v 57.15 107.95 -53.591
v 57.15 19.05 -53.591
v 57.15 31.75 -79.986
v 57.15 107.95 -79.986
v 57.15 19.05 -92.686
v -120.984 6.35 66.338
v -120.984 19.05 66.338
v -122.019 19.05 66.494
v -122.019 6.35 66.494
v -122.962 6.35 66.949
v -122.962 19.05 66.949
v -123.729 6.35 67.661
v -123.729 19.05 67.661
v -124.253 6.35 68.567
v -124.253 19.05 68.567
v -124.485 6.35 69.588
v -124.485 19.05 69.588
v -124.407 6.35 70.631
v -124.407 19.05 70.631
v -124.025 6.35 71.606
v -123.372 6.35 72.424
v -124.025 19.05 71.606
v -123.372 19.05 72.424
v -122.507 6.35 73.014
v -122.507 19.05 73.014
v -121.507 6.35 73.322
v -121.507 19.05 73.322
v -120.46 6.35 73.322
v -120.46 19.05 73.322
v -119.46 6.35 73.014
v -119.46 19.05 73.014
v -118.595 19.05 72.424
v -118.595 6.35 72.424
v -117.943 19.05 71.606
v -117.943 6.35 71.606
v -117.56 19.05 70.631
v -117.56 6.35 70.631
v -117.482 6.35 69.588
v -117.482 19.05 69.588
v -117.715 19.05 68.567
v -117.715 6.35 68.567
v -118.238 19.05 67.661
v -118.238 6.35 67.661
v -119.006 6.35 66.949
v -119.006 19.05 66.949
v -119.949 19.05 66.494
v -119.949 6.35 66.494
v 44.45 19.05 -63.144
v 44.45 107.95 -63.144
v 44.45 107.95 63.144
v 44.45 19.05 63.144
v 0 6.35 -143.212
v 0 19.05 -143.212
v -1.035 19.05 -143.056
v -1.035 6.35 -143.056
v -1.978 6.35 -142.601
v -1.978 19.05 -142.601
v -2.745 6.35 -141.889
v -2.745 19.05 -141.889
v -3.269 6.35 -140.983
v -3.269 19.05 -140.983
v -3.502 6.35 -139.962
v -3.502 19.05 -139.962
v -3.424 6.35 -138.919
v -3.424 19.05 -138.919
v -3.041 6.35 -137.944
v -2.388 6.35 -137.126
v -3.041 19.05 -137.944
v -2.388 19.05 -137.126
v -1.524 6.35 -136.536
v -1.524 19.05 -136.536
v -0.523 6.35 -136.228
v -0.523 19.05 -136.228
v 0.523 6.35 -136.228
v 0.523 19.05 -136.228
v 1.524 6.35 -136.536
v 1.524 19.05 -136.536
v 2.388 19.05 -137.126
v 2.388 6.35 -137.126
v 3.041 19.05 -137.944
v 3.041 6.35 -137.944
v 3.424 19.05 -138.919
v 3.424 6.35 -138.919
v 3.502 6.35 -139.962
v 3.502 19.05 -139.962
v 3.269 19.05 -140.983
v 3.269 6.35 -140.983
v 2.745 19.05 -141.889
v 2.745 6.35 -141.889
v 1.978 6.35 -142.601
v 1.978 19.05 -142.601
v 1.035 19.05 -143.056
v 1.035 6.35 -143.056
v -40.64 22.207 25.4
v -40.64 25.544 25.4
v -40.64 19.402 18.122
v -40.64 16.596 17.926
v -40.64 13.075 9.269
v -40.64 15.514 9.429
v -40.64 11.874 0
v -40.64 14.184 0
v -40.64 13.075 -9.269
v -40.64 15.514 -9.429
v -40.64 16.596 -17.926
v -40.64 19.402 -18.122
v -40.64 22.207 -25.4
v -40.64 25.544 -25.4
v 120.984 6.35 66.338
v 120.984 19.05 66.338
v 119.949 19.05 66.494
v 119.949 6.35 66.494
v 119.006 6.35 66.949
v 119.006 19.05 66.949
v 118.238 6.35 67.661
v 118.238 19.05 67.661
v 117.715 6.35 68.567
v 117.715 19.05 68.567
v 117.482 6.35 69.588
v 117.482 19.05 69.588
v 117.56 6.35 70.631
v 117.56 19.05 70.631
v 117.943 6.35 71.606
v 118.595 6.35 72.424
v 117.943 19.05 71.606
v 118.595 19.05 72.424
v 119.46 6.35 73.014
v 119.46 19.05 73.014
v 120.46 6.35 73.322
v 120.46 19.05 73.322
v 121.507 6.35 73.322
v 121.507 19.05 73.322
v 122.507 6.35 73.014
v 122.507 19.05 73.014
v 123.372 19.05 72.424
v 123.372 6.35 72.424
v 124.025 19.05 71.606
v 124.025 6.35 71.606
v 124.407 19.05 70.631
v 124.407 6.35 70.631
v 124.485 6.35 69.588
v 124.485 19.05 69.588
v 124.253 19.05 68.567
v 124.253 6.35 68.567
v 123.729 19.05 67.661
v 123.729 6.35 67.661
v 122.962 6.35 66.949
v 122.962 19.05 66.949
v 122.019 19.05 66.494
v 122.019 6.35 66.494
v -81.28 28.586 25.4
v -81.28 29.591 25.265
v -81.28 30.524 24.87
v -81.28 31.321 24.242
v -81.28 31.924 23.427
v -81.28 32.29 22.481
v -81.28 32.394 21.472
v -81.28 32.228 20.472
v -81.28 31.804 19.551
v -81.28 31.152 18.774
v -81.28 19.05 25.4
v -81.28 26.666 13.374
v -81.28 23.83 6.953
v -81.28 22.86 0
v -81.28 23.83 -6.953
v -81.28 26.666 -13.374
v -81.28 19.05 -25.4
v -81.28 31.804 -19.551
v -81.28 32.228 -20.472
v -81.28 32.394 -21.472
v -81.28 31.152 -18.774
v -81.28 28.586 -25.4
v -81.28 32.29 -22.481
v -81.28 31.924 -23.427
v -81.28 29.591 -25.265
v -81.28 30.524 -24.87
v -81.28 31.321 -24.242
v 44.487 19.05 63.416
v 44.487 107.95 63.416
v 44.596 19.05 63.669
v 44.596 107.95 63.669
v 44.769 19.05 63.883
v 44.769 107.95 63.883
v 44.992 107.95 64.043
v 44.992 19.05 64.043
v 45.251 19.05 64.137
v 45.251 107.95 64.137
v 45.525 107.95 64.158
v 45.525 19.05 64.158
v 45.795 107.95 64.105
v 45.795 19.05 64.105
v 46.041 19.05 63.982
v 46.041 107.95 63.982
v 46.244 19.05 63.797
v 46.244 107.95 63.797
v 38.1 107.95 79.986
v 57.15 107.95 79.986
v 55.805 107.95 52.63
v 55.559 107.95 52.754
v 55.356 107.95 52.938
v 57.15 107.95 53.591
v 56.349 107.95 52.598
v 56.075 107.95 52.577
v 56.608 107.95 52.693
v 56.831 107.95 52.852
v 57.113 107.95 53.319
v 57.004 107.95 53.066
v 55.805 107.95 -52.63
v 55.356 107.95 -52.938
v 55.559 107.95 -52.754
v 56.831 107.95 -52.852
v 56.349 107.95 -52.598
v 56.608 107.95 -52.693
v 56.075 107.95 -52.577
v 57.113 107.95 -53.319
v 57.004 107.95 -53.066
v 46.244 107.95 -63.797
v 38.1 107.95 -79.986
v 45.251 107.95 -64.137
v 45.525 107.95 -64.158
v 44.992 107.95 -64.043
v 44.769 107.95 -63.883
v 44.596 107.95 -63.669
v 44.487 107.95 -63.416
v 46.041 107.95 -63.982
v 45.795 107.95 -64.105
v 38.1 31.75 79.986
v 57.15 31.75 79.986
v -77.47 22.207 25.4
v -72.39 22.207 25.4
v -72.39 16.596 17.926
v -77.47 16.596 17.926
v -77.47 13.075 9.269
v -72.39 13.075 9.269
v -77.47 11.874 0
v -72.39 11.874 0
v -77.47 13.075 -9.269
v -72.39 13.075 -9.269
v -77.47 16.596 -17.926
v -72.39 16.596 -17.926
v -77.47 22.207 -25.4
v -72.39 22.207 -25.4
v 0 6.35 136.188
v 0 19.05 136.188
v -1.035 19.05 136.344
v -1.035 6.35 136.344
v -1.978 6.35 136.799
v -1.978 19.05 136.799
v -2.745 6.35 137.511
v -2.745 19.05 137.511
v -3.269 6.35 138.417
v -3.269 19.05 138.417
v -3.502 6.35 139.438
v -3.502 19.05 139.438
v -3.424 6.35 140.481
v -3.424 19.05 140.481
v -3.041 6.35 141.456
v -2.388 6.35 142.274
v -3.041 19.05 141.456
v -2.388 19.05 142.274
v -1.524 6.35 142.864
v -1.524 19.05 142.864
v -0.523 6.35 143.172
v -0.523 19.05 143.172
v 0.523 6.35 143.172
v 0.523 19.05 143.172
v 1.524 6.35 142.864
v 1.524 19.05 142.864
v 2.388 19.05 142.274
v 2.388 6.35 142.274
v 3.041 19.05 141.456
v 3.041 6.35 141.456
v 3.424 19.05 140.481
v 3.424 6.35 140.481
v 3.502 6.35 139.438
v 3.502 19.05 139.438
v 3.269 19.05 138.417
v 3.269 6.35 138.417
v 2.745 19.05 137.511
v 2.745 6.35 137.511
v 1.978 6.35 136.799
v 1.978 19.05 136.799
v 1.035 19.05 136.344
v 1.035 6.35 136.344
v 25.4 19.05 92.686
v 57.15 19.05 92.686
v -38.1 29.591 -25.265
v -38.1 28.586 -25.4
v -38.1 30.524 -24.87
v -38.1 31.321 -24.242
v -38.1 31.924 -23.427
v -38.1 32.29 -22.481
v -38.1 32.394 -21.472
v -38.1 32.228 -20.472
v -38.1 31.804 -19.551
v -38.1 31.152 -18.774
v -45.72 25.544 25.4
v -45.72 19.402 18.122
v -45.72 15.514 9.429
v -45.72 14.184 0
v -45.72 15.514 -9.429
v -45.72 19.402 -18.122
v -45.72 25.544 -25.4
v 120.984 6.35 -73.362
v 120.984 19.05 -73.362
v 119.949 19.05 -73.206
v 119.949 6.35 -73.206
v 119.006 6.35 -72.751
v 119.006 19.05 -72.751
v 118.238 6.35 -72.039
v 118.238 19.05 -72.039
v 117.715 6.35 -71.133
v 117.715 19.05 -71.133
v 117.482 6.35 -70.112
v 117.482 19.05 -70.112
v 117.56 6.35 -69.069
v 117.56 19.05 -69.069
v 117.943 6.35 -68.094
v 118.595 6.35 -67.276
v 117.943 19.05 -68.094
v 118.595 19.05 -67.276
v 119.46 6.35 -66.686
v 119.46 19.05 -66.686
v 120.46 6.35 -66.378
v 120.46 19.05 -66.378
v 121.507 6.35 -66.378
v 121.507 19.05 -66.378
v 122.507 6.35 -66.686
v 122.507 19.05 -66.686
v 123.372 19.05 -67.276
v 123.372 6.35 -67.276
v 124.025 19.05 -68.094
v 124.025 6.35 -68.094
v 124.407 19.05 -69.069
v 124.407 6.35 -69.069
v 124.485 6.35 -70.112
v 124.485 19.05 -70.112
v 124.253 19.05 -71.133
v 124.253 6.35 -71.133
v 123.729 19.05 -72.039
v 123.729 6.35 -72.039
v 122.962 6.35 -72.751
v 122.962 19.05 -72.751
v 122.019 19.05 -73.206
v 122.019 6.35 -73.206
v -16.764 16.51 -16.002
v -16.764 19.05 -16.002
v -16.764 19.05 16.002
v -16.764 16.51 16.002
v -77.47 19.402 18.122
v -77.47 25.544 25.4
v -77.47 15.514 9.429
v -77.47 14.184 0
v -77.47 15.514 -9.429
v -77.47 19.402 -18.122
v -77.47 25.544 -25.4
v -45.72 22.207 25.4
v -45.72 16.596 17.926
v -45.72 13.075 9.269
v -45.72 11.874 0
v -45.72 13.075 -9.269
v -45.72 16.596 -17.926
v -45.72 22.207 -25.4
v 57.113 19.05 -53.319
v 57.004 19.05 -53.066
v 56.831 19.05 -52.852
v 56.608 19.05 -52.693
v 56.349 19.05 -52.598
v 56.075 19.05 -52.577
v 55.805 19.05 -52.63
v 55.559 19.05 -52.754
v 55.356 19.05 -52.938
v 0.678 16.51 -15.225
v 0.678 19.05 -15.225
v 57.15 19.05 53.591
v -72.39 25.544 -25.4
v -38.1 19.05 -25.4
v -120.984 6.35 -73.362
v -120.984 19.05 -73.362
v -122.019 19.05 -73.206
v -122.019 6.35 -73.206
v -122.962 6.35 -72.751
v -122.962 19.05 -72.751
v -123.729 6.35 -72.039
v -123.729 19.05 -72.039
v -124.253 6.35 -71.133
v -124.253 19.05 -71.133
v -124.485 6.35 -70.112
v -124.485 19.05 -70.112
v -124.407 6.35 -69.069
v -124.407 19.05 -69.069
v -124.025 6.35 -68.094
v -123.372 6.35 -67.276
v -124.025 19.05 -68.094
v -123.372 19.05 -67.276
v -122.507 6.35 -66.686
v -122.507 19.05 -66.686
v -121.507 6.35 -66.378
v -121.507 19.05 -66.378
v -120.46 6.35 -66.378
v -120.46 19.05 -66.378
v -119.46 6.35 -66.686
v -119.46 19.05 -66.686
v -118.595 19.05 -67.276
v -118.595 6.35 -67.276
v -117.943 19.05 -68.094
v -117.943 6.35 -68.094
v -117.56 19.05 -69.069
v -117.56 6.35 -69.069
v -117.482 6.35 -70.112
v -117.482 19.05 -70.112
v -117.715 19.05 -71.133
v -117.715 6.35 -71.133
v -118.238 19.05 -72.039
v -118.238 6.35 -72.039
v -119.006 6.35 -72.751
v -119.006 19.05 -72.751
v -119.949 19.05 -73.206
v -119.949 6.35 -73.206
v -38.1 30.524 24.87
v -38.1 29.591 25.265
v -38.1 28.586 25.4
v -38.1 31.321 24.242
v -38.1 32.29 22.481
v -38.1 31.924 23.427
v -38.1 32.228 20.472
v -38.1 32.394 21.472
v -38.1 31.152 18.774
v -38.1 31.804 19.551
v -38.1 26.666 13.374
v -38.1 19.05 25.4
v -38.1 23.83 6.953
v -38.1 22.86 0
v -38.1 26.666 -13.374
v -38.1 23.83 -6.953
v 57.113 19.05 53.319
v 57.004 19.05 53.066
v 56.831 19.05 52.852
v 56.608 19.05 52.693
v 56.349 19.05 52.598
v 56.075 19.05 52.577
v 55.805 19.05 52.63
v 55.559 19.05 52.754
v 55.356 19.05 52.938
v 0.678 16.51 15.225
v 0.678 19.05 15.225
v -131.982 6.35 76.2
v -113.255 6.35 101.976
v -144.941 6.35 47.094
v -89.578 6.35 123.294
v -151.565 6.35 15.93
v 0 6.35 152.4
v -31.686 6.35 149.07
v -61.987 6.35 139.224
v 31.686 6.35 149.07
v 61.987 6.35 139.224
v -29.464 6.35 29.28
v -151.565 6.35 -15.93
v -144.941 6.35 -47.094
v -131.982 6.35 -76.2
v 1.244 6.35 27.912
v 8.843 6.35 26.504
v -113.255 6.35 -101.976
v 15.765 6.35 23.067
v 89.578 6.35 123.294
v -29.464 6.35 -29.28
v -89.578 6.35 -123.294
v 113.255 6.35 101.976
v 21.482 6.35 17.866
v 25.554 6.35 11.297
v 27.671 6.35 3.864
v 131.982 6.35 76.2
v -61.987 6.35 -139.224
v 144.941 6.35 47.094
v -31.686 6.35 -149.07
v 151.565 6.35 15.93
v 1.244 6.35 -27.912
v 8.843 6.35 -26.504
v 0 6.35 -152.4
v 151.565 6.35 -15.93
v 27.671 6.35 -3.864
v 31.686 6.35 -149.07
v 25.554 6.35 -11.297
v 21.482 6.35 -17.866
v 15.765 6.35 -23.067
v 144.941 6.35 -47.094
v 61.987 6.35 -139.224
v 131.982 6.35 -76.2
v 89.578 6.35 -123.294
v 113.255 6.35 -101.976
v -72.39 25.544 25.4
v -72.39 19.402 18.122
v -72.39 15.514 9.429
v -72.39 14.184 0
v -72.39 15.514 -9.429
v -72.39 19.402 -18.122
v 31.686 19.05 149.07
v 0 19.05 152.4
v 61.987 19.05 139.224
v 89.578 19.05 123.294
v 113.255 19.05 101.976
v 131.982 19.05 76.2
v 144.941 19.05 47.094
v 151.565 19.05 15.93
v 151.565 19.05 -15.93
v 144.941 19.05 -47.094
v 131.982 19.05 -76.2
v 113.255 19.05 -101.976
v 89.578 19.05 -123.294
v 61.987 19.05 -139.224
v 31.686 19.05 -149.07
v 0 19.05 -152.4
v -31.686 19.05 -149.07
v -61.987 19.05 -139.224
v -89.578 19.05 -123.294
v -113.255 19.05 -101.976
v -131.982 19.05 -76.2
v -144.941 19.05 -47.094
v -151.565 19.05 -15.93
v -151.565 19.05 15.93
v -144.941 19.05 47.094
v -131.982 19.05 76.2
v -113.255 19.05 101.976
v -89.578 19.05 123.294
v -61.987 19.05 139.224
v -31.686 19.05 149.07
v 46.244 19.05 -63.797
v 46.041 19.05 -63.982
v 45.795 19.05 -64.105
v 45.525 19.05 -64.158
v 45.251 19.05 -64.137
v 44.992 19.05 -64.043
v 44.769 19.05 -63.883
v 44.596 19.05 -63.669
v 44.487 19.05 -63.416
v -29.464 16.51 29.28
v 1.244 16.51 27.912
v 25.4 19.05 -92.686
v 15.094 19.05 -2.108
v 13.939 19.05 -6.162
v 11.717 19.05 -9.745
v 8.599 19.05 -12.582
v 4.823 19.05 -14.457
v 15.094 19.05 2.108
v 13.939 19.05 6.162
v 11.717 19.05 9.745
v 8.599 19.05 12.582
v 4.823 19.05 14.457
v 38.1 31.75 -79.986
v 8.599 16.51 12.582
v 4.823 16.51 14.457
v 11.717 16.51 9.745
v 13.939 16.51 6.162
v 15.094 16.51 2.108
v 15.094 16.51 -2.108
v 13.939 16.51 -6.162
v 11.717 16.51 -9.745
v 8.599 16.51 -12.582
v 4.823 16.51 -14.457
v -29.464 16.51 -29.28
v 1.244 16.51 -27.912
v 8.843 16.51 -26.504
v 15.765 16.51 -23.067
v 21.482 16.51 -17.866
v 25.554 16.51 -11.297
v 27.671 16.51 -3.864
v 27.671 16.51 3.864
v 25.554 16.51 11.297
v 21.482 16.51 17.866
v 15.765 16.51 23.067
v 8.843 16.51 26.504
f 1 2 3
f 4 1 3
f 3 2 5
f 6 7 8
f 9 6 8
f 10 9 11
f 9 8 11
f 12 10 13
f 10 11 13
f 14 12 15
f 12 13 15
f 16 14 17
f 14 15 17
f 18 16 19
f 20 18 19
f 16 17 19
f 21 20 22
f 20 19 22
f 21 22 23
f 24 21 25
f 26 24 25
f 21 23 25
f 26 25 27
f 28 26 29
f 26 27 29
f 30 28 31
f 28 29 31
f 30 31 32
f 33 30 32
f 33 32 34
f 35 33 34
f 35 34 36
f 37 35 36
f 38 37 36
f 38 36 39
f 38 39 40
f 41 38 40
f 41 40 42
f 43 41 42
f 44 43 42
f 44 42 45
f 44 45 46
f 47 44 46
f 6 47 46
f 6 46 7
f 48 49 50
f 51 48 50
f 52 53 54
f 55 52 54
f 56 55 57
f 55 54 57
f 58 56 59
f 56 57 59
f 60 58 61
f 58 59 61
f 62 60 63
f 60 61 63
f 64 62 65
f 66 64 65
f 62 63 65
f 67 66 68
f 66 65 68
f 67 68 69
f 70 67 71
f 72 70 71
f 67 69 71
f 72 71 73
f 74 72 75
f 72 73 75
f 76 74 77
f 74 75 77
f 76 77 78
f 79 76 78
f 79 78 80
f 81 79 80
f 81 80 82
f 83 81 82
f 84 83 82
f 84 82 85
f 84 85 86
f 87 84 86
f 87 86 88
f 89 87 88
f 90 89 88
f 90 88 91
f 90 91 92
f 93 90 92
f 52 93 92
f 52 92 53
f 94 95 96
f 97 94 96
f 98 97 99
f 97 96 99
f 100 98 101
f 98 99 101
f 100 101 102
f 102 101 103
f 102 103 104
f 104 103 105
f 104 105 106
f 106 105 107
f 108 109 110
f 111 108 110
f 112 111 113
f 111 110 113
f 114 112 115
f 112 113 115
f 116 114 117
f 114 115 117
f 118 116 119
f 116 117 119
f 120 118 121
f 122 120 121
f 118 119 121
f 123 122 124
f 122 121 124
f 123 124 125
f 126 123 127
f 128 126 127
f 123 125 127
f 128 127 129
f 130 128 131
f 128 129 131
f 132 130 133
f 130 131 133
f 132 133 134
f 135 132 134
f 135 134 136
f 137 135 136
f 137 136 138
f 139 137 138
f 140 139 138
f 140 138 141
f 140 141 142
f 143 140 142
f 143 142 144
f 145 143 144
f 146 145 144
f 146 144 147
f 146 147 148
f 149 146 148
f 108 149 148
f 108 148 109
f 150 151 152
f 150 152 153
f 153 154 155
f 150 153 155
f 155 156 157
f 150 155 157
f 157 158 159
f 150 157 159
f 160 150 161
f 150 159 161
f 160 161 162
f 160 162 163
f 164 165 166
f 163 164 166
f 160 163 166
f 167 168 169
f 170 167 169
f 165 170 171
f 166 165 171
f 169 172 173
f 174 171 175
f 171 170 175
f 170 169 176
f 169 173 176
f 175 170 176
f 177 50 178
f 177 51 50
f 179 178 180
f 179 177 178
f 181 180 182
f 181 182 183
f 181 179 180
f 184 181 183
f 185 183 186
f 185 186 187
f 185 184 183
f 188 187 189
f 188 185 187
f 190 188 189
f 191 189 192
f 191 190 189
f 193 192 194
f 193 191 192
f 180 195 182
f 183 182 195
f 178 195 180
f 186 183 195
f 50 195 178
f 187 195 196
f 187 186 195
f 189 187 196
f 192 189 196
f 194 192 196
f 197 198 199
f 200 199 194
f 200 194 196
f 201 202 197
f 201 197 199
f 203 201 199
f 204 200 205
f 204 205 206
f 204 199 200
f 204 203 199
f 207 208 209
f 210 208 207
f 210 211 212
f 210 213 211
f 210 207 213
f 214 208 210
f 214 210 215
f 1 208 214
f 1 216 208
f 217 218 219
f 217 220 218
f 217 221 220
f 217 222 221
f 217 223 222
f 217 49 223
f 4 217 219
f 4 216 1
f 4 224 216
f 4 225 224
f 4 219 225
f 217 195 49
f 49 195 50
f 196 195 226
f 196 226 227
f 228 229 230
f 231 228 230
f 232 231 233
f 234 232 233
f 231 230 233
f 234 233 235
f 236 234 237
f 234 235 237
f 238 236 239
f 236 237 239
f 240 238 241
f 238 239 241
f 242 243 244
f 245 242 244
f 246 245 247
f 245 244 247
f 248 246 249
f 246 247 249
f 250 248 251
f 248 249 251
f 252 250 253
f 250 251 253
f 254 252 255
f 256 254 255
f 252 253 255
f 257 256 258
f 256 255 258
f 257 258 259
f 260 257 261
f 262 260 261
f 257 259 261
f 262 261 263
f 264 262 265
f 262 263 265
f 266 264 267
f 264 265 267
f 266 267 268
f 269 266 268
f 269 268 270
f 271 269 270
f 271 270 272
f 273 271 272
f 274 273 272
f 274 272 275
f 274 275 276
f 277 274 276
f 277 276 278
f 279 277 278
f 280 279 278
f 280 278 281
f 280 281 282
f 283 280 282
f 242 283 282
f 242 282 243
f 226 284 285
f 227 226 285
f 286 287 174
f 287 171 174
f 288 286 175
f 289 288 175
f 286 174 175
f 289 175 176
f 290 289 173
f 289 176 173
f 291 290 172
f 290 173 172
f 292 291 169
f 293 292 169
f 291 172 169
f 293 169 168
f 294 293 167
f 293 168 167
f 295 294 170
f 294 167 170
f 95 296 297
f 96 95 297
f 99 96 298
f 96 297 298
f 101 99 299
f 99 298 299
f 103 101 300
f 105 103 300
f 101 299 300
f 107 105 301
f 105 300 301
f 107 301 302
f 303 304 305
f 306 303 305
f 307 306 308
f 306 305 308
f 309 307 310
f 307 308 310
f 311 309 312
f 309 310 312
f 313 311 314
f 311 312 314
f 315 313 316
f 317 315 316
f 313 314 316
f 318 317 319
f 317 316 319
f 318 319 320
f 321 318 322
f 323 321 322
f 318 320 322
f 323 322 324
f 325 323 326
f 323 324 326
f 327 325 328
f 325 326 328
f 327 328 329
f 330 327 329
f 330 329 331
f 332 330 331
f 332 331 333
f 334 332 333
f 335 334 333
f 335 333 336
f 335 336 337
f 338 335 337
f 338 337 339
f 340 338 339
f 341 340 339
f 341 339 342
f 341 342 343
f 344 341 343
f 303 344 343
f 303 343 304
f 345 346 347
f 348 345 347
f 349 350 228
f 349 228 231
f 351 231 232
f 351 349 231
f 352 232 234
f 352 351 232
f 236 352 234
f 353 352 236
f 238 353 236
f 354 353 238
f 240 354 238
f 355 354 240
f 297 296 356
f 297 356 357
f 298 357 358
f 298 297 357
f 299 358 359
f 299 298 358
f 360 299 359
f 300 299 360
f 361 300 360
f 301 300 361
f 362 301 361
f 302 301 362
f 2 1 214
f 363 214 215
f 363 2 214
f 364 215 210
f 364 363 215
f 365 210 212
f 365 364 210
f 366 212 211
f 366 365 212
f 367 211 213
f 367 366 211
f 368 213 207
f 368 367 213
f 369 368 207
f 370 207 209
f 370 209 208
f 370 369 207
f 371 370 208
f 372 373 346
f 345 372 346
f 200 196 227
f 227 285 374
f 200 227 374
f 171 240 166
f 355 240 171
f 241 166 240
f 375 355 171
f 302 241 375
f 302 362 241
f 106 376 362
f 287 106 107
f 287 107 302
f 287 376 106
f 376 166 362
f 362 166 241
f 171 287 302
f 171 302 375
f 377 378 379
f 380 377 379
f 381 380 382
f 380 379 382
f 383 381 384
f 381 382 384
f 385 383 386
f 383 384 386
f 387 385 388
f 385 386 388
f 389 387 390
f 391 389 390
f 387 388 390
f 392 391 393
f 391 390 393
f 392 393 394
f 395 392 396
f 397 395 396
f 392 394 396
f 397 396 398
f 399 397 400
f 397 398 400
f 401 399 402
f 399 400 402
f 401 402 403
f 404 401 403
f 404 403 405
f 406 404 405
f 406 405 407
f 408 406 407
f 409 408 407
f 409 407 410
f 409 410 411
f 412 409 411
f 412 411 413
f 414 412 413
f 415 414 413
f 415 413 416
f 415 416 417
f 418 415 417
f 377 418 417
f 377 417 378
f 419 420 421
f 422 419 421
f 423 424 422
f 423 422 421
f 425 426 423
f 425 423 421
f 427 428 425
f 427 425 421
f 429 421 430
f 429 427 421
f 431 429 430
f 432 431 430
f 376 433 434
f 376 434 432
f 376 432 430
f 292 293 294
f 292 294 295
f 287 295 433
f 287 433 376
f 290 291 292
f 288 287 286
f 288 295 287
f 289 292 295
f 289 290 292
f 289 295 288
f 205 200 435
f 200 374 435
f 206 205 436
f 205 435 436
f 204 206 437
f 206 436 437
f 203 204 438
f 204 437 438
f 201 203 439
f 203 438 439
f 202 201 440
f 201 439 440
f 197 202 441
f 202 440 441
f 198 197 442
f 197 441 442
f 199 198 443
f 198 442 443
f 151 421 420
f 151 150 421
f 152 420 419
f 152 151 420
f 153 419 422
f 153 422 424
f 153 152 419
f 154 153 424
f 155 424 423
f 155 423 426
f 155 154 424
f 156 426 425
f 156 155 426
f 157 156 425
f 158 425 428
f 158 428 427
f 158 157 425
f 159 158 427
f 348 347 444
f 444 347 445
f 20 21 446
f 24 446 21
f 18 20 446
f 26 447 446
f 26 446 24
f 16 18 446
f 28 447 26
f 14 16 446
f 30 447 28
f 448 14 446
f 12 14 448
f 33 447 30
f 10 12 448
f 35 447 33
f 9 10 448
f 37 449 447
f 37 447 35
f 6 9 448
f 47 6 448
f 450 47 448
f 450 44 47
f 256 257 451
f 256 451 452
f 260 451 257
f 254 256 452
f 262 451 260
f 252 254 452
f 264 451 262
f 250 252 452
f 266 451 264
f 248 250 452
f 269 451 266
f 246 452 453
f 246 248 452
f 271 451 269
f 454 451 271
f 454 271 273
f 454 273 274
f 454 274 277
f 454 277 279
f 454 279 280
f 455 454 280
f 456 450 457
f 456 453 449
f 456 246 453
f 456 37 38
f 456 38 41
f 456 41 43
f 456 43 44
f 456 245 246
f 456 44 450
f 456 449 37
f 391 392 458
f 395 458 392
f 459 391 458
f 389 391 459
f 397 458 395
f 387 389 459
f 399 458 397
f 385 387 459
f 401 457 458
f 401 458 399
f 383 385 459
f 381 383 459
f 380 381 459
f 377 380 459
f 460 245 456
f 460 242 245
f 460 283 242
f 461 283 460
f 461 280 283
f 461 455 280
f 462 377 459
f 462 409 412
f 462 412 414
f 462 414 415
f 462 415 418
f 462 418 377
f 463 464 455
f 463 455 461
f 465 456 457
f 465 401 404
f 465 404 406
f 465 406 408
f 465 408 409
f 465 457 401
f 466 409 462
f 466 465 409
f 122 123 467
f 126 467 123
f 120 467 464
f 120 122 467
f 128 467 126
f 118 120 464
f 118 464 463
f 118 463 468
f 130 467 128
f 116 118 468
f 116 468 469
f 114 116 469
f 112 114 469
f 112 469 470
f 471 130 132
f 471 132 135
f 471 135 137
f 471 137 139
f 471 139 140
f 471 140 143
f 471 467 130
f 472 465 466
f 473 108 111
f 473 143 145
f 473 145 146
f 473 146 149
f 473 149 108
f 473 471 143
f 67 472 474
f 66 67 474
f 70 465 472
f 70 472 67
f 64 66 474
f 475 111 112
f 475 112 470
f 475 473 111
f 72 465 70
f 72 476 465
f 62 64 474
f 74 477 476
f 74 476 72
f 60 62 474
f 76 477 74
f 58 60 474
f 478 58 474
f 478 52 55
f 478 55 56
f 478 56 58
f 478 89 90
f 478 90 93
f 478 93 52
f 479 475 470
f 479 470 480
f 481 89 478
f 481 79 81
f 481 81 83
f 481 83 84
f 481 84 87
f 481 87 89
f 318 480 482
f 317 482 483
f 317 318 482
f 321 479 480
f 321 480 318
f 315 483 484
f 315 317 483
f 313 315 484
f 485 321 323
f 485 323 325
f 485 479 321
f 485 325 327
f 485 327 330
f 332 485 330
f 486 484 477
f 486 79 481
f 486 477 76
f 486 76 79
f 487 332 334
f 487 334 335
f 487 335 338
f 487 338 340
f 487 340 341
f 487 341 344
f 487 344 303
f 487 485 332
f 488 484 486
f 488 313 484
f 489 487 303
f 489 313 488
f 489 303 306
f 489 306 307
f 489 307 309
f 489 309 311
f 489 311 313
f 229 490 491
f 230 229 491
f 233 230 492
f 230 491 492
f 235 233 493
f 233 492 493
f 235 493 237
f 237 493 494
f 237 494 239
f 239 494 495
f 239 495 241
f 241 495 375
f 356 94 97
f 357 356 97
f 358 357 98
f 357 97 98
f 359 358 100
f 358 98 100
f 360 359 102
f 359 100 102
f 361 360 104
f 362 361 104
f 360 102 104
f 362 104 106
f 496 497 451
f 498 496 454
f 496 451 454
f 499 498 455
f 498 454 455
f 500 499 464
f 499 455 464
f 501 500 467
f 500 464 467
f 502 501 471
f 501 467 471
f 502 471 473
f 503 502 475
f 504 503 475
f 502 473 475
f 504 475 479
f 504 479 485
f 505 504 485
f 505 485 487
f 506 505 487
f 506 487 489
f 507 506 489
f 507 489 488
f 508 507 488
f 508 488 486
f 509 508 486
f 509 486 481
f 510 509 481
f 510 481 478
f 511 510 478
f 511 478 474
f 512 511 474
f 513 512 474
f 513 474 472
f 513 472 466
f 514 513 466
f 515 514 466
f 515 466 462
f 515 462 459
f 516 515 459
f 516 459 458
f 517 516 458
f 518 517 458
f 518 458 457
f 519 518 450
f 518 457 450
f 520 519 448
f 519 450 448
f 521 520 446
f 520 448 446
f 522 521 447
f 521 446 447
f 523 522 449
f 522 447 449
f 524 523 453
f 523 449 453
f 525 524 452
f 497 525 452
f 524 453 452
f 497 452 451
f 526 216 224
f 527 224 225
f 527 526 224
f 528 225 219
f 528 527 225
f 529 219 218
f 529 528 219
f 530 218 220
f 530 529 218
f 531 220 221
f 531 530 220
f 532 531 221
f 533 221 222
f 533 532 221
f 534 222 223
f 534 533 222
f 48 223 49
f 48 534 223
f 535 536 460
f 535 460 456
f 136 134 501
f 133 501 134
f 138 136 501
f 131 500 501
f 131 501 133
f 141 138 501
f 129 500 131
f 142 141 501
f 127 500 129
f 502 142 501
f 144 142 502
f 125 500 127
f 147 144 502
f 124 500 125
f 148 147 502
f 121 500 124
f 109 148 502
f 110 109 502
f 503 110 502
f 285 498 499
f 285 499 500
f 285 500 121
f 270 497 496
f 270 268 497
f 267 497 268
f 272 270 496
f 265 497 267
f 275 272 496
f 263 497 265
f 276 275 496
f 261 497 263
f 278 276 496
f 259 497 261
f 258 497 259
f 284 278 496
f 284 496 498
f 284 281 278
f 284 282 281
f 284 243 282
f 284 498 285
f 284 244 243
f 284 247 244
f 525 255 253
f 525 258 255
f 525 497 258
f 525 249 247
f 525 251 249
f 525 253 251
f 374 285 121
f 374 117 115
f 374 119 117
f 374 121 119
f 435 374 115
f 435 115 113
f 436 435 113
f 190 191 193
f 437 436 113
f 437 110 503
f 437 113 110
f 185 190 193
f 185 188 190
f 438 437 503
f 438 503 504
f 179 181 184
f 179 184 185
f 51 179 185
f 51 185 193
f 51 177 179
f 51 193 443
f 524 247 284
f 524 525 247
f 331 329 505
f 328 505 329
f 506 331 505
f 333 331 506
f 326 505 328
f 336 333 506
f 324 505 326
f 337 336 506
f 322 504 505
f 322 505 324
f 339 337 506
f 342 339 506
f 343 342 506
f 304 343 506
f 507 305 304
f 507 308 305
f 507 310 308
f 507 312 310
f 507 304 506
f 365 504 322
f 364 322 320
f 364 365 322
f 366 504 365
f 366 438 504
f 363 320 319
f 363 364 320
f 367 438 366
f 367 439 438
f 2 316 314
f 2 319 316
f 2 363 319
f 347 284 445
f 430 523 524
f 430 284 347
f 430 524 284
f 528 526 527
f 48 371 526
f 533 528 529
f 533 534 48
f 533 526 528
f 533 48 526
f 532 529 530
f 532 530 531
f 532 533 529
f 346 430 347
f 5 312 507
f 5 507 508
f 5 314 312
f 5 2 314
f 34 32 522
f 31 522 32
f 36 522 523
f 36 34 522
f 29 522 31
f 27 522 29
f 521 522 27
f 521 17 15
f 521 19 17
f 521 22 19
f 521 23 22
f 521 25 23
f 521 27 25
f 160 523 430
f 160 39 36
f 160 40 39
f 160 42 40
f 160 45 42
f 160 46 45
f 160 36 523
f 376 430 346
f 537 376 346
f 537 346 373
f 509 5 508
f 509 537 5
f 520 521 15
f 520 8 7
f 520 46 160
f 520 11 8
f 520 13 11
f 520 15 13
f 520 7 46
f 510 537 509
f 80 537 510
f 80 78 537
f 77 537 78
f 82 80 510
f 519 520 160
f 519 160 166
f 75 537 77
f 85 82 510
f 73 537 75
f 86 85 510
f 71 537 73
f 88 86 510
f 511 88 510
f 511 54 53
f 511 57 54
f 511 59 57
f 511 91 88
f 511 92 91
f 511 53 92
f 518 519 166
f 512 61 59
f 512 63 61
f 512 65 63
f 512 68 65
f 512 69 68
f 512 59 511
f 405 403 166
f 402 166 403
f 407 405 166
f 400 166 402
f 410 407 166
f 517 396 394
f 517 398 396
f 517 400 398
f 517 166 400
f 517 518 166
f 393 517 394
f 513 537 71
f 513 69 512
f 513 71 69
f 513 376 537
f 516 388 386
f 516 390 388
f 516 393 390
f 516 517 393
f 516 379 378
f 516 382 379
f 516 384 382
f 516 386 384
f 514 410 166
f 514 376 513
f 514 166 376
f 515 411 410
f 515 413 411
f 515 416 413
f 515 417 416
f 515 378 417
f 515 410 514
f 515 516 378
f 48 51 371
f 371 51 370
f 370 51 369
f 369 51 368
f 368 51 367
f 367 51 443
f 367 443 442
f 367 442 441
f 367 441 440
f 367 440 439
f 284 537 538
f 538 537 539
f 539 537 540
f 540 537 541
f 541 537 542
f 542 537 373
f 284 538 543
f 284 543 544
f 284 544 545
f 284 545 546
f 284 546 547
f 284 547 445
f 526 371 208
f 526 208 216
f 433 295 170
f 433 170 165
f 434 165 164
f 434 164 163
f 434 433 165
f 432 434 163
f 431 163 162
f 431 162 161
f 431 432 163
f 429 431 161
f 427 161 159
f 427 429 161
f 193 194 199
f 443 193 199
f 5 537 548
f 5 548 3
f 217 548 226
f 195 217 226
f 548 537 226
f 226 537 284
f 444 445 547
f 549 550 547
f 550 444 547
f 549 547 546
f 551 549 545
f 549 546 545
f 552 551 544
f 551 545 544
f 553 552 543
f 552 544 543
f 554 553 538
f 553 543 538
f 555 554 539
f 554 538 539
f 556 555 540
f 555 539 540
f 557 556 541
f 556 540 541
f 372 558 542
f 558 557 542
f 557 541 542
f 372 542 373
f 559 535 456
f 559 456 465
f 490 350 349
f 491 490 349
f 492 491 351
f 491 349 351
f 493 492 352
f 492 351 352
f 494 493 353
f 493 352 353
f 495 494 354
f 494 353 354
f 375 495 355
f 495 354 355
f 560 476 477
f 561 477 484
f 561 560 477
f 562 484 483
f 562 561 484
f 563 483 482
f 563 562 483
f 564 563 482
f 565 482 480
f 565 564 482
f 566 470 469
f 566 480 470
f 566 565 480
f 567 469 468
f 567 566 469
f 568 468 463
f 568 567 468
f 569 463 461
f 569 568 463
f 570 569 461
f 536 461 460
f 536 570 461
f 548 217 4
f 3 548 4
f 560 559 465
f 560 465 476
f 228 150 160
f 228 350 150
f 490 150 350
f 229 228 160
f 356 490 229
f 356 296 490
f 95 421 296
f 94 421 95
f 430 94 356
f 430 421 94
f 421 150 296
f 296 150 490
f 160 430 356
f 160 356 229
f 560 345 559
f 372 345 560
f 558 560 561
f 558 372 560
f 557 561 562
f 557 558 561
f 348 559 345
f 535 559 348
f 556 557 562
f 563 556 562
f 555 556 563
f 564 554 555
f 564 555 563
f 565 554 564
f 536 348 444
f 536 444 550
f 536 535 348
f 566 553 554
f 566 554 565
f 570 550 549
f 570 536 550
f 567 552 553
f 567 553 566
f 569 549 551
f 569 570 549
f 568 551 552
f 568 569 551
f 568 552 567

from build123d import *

# Parameters (mm, degrees)
SKETCH1_R           = 127
BOSS_EXTRUDE1_DEPTH = 19.05
CUT_EXTRUDE1_DEPTH  = 19.05
BOSS_EXTRUDE2_DEPTH = 43.18
FILLET1_R           = 3.81
CUT_EXTRUDE4_START  = -5.08
SKETCH7_R           = 36.385525633
SKETCH7_R_2         = 34.07613751
CUT_EXTRUDE4_DEPTH  = 2.54
CUT_EXTRUDE5_START  = -36.83
SKETCH8_R           = 36.385525633
SKETCH8_R_2         = 34.07613751
CUT_EXTRUDE5_DEPTH  = 2.54
SKETCH4_R           = 152.4
SKETCH4_R_2         = 127
BOSS_EXTRUDE3_DEPTH = 190.5
CUT_EXTRUDE2_START  = 12.7
CUT_EXTRUDE2_DEPTH  = 12.7
CUT_EXTRUDE6_START  = -12.7
SKETCH6_R           = 3.51155
CUT_EXTRUDE6_DEPTH  = 171.45
BOSS_EXTRUDE4_DEPTH = 88.9
CUT_EXTRUDE8_DEPTH  = 88.9
FILLET2_R           = 1.016
CUT_EXTRUDE9_START  = -16.51
CUT_EXTRUDE9_DEPTH  = 16.51
CUT_EXTRUDE12_START = -171.45
SKETCH14_R          = 152.4
SKETCH14_R_2        = 127
CUT_EXTRUDE12_DEPTH = 171.45
SKETCH15_R          = 152.4
CUT_EXTRUDE13_DEPTH = 6.35
SKETCH17_W          = 19.05
SKETCH17_H          = 41.16468875
CUT_EXTRUDE15_DEPTH = 88.9
CHAMFER2_SIZE       = 12.7


with BuildPart() as part:
    # Sketch1 → Boss-Extrude1 (new body)
    with BuildSketch(Plane(origin=(0, 0, 0), x_dir=(1, 0, 0), z_dir=(0, 1, 0))):
        with Locations(Location((0, 0, 0), (0, 0, 90))):
            Circle(SKETCH1_R)
    extrude(amount=BOSS_EXTRUDE1_DEPTH)

    # Sketch2 → Cut-Extrude1 (cut)
    with BuildSketch(Plane(origin=(0, 19.05, 0), x_dir=(1, 0, 0), z_dir=(0, 1, 0))):
        with BuildLine():
            Line((-16.764, 16.002), (-16.764, -16.002))
            Line((-16.764, -16.002), (0.678310948, -15.224897184))
            ThreePointArc((0.678310948, -15.224897184), (15.24, 0), (0.678310948, 15.224897184))
            Line((0.678310948, 15.224897184), (-16.764, 16.002))
        make_face()
    extrude(amount=-CUT_EXTRUDE1_DEPTH, mode=Mode.SUBTRACT)

    # Sketch3 → Boss-Extrude2 (add)
    with BuildSketch(Plane(origin=(-38.1, 0, 0), x_dir=(0, 0, -1), z_dir=(1, 0, 0))):
        with BuildLine():
            Line((-25.4, 19.05), (25.4, 19.05))
            Line((25.4, 19.05), (25.4, 48.26))
            ThreePointArc((25.4, 48.26), (0, 22.86), (-25.4, 48.26))
            Line((-25.4, 48.26), (-25.4, 19.05))
        make_face()
    extrude(amount=-BOSS_EXTRUDE2_DEPTH)

    # Fillet1
    fillet1_edges = [part.edges().sort_by_distance(p)[0] for p in [
        (-59.69, 48.26, 25.4),
        (-59.69, 48.26, -25.4),
    ]]
    fillet(fillet1_edges, radius=FILLET1_R - 0.0001)  # a hair under: the kernel refuses the full size

    # Sketch7 → Cut-Extrude4 (cut, symmetric)
    with BuildSketch(Plane(origin=(-38.1, 0, 0), x_dir=(0, 0, -1), z_dir=(1, 0, 0)).offset(CUT_EXTRUDE4_START)):
        with Locations((0, 48.26)):
            Circle(SKETCH7_R)
        with Locations((0, 48.26)):
            Circle(SKETCH7_R_2, mode=Mode.SUBTRACT)
    extrude(amount=CUT_EXTRUDE4_DEPTH, both=True, mode=Mode.SUBTRACT)

    # Sketch8 → Cut-Extrude5 (cut, symmetric)
    with BuildSketch(Plane(origin=(-38.1, 0, -38.1), x_dir=(0, 0, -1), z_dir=(1, 0, 0)).offset(CUT_EXTRUDE5_START)):
        with Locations((-38.1, 48.26)):
            Circle(SKETCH8_R)
        with Locations((-38.1, 48.26)):
            Circle(SKETCH8_R_2, mode=Mode.SUBTRACT)
    extrude(amount=CUT_EXTRUDE5_DEPTH, both=True, mode=Mode.SUBTRACT)

    # Sketch4 → Boss-Extrude3 (add)
    with BuildSketch(Plane(origin=(0, 0, 0), x_dir=(1, 0, 0), z_dir=(0, 1, 0))):
        with Locations(Location((0, 0, 0), (0, 0, 270))):
            Circle(SKETCH4_R)
        with Locations(Location((0, 0, 0), (0, 0, 270))):
            Circle(SKETCH4_R_2, mode=Mode.SUBTRACT)
    extrude(amount=BOSS_EXTRUDE3_DEPTH)

    # Sketch5 → Cut-Extrude2 (cut)
    with BuildSketch(Plane(origin=(0, 190.5, -228.6), x_dir=(1, 0, 0), z_dir=(0, -1, 0)).offset(CUT_EXTRUDE2_START)):
        with BuildLine():
            Line((-25.4, 351.737617729), (-25.4, 378.868426491))
            ThreePointArc((-25.4, 378.868426491), (0, 381), (25.4, 378.868426491))
            Line((25.4, 378.868426491), (25.4, 351.737617729))
            ThreePointArc((25.4, 351.737617729), (62.865, 337.485374018), (93.940305115, 312.165854121))
            Line((93.940305115, 312.165854121), (117.436274728, 325.731258501))
            ThreePointArc((117.436274728, 325.731258501), (131.982271537, 304.8), (142.836274728, 281.737167989))
            Line((142.836274728, 281.737167989), (119.340305115, 268.171763608))
            ThreePointArc((119.340305115, 268.171763608), (125.73, 228.6), (119.340305115, 189.028236392))
            Line((119.340305115, 189.028236392), (142.836274728, 175.462832011))
            ThreePointArc((142.836274728, 175.462832011), (131.982271537, 152.4), (117.436274728, 131.468741499))
            Line((117.436274728, 131.468741499), (93.940305115, 145.034145879))
            ThreePointArc((93.940305115, 145.034145879), (62.865, 119.714625982), (25.4, 105.462382271))
            Line((25.4, 105.462382271), (25.4, 78.331573509))
            ThreePointArc((25.4, 78.331573509), (0, 76.2), (-25.4, 78.331573509))
            Line((-25.4, 78.331573509), (-25.4, 105.462382271))
            ThreePointArc((-25.4, 105.462382271), (-62.865, 119.714625982), (-93.940305115, 145.034145879))
            Line((-93.940305115, 145.034145879), (-117.436274728, 131.468741499))
            ThreePointArc((-117.436274728, 131.468741499), (-131.982271537, 152.4), (-142.836274728, 175.462832011))
            Line((-142.836274728, 175.462832011), (-119.340305115, 189.028236392))
            ThreePointArc((-119.340305115, 189.028236392), (-125.73, 228.6), (-119.340305115, 268.171763608))
            Line((-119.340305115, 268.171763608), (-142.836274728, 281.737167989))
            ThreePointArc((-142.836274728, 281.737167989), (-131.982271537, 304.8), (-117.436274728, 325.731258501))
            Line((-117.436274728, 325.731258501), (-93.940305115, 312.165854121))
            ThreePointArc((-93.940305115, 312.165854121), (-62.865, 337.485374018), (-25.4, 351.737617729))
        make_face()
    extrude(amount=-CUT_EXTRUDE2_DEPTH, mode=Mode.SUBTRACT)

    # Sketch6 → Cut-Extrude6 (cut)
    with BuildSketch(Plane(origin=(0, 190.5, 0), x_dir=(1, 0, 0), z_dir=(0, 1, 0)).offset(CUT_EXTRUDE6_START)):
        with Locations(Location((0, 139.7, 0), (0, 0, 90))):
            Circle(SKETCH6_R)
        with Locations(Location((120.983748909, 69.85, 0), (0, 0, 90))):
            Circle(SKETCH6_R)
        with Locations(Location((120.983748909, -69.85, 0), (0, 0, 90))):
            Circle(SKETCH6_R)
        with Locations(Location((0, -139.7, 0), (0, 0, 90))):
            Circle(SKETCH6_R)
        with Locations(Location((-120.983748909, -69.85, 0), (0, 0, 90))):
            Circle(SKETCH6_R)
        with Locations(Location((-120.983748909, 69.85, 0), (0, 0, 90))):
            Circle(SKETCH6_R)
    extrude(amount=-CUT_EXTRUDE6_DEPTH, mode=Mode.SUBTRACT)

    # Sketch9 → Boss-Extrude4 (add)
    with BuildSketch(Plane(origin=(0, 19.05, 0), x_dir=(1, 0, 0), z_dir=(0, 1, 0))):
        with BuildLine():
            Line((38.1, 121.15027858), (38.1, -121.15027858))
            ThreePointArc((38.1, -121.15027858), (47.781803057, -117.668599451), (57.15, -113.414626482))
            Line((57.15, -113.414626482), (57.15, 113.414626482))
            ThreePointArc((57.15, 113.414626482), (47.781803057, 117.668599451), (38.1, 121.15027858))
        make_face()
    extrude(amount=BOSS_EXTRUDE4_DEPTH)

    # Sketch10 → Cut-Extrude8 (cut)
    with BuildSketch(Plane(origin=(0, 107.95, 0), x_dir=(1, 0, 0), z_dir=(0, 1, 0))):
        Polygon((57.15, -50.8), (57.15, 50.8), (44.45, 65.935270626), (44.45, -65.935270626), align=None)
    extrude(amount=-CUT_EXTRUDE8_DEPTH, mode=Mode.SUBTRACT)

    # Fillet2
    fillet2_edges = [part.edges().sort_by_distance(p)[0] for p in [
        (44.45, 63.5, 65.935270626),
        (44.45, 63.5, -65.935270626),
        (57.15, 63.5, -50.8),
        (57.15, 63.5, 50.8),
    ]]
    fillet(fillet2_edges, radius=FILLET2_R)

    # Sketch11 → Cut-Extrude9 (cut)
    with BuildSketch(Plane.XZ.offset(CUT_EXTRUDE9_START)):
        with BuildLine():
            Line((-29.464, 29.280418015), (-29.464, -29.280418015))
            Line((-29.464, -29.280418015), (1.243570072, -27.912311504))
            ThreePointArc((1.243570072, -27.912311504), (27.94, 0), (1.243570072, 27.912311504))
            Line((1.243570072, 27.912311504), (-29.464, 29.280418015))
        make_face()
        with BuildLine():
            Line((-16.764, 16.002), (-16.764, -16.002))
            Line((-16.764, -16.002), (0.678310948, -15.224897184))
            ThreePointArc((0.678310948, -15.224897184), (15.24, 0), (0.678310948, 15.224897184))
            Line((0.678310948, 15.224897184), (-16.764, 16.002))
        make_face(mode=Mode.SUBTRACT)
    extrude(amount=CUT_EXTRUDE9_DEPTH, mode=Mode.SUBTRACT)

    # Sketch14 → Cut-Extrude12 (cut)
    with BuildSketch(Plane(origin=(0, 190.5, 0), x_dir=(1, 0, 0), z_dir=(0, 1, 0)).offset(CUT_EXTRUDE12_START)):
        with Locations(Location((0, 0, 0), (0, 0, 270))):
            Circle(SKETCH14_R)
        Circle(SKETCH14_R_2, mode=Mode.SUBTRACT)
    extrude(amount=CUT_EXTRUDE12_DEPTH, mode=Mode.SUBTRACT)

    # Sketch15 → Cut-Extrude13 (cut)
    with BuildSketch(Plane.XZ):
        with Locations(Location((0, 0, 0), (0, 0, 270))):
            Circle(SKETCH15_R)
    extrude(amount=-CUT_EXTRUDE13_DEPTH, mode=Mode.SUBTRACT)

    # Sketch17 → Cut-Extrude15 (cut)
    with BuildSketch(Plane(origin=(0, 107.95, 0), x_dir=(1, 0, 0), z_dir=(0, 1, 0))):
        with Locations((47.625, 100.567934205)):
            Rectangle(SKETCH17_W, SKETCH17_H)
        with Locations((47.625, -100.567934205)):
            Rectangle(SKETCH17_W, SKETCH17_H)
    extrude(amount=-CUT_EXTRUDE15_DEPTH, mode=Mode.SUBTRACT)

    # Chamfer2
    chamfer2_edges = [part.edges().sort_by_distance(p)[0] for p in [
        (38.1, 19.05, 0),
        (47.625, 19.05, -79.98558983),
        (47.625, 19.05, 79.98558983),
    ]]
    chamfer(chamfer2_edges, length=CHAMFER2_SIZE)


solid = part.part
